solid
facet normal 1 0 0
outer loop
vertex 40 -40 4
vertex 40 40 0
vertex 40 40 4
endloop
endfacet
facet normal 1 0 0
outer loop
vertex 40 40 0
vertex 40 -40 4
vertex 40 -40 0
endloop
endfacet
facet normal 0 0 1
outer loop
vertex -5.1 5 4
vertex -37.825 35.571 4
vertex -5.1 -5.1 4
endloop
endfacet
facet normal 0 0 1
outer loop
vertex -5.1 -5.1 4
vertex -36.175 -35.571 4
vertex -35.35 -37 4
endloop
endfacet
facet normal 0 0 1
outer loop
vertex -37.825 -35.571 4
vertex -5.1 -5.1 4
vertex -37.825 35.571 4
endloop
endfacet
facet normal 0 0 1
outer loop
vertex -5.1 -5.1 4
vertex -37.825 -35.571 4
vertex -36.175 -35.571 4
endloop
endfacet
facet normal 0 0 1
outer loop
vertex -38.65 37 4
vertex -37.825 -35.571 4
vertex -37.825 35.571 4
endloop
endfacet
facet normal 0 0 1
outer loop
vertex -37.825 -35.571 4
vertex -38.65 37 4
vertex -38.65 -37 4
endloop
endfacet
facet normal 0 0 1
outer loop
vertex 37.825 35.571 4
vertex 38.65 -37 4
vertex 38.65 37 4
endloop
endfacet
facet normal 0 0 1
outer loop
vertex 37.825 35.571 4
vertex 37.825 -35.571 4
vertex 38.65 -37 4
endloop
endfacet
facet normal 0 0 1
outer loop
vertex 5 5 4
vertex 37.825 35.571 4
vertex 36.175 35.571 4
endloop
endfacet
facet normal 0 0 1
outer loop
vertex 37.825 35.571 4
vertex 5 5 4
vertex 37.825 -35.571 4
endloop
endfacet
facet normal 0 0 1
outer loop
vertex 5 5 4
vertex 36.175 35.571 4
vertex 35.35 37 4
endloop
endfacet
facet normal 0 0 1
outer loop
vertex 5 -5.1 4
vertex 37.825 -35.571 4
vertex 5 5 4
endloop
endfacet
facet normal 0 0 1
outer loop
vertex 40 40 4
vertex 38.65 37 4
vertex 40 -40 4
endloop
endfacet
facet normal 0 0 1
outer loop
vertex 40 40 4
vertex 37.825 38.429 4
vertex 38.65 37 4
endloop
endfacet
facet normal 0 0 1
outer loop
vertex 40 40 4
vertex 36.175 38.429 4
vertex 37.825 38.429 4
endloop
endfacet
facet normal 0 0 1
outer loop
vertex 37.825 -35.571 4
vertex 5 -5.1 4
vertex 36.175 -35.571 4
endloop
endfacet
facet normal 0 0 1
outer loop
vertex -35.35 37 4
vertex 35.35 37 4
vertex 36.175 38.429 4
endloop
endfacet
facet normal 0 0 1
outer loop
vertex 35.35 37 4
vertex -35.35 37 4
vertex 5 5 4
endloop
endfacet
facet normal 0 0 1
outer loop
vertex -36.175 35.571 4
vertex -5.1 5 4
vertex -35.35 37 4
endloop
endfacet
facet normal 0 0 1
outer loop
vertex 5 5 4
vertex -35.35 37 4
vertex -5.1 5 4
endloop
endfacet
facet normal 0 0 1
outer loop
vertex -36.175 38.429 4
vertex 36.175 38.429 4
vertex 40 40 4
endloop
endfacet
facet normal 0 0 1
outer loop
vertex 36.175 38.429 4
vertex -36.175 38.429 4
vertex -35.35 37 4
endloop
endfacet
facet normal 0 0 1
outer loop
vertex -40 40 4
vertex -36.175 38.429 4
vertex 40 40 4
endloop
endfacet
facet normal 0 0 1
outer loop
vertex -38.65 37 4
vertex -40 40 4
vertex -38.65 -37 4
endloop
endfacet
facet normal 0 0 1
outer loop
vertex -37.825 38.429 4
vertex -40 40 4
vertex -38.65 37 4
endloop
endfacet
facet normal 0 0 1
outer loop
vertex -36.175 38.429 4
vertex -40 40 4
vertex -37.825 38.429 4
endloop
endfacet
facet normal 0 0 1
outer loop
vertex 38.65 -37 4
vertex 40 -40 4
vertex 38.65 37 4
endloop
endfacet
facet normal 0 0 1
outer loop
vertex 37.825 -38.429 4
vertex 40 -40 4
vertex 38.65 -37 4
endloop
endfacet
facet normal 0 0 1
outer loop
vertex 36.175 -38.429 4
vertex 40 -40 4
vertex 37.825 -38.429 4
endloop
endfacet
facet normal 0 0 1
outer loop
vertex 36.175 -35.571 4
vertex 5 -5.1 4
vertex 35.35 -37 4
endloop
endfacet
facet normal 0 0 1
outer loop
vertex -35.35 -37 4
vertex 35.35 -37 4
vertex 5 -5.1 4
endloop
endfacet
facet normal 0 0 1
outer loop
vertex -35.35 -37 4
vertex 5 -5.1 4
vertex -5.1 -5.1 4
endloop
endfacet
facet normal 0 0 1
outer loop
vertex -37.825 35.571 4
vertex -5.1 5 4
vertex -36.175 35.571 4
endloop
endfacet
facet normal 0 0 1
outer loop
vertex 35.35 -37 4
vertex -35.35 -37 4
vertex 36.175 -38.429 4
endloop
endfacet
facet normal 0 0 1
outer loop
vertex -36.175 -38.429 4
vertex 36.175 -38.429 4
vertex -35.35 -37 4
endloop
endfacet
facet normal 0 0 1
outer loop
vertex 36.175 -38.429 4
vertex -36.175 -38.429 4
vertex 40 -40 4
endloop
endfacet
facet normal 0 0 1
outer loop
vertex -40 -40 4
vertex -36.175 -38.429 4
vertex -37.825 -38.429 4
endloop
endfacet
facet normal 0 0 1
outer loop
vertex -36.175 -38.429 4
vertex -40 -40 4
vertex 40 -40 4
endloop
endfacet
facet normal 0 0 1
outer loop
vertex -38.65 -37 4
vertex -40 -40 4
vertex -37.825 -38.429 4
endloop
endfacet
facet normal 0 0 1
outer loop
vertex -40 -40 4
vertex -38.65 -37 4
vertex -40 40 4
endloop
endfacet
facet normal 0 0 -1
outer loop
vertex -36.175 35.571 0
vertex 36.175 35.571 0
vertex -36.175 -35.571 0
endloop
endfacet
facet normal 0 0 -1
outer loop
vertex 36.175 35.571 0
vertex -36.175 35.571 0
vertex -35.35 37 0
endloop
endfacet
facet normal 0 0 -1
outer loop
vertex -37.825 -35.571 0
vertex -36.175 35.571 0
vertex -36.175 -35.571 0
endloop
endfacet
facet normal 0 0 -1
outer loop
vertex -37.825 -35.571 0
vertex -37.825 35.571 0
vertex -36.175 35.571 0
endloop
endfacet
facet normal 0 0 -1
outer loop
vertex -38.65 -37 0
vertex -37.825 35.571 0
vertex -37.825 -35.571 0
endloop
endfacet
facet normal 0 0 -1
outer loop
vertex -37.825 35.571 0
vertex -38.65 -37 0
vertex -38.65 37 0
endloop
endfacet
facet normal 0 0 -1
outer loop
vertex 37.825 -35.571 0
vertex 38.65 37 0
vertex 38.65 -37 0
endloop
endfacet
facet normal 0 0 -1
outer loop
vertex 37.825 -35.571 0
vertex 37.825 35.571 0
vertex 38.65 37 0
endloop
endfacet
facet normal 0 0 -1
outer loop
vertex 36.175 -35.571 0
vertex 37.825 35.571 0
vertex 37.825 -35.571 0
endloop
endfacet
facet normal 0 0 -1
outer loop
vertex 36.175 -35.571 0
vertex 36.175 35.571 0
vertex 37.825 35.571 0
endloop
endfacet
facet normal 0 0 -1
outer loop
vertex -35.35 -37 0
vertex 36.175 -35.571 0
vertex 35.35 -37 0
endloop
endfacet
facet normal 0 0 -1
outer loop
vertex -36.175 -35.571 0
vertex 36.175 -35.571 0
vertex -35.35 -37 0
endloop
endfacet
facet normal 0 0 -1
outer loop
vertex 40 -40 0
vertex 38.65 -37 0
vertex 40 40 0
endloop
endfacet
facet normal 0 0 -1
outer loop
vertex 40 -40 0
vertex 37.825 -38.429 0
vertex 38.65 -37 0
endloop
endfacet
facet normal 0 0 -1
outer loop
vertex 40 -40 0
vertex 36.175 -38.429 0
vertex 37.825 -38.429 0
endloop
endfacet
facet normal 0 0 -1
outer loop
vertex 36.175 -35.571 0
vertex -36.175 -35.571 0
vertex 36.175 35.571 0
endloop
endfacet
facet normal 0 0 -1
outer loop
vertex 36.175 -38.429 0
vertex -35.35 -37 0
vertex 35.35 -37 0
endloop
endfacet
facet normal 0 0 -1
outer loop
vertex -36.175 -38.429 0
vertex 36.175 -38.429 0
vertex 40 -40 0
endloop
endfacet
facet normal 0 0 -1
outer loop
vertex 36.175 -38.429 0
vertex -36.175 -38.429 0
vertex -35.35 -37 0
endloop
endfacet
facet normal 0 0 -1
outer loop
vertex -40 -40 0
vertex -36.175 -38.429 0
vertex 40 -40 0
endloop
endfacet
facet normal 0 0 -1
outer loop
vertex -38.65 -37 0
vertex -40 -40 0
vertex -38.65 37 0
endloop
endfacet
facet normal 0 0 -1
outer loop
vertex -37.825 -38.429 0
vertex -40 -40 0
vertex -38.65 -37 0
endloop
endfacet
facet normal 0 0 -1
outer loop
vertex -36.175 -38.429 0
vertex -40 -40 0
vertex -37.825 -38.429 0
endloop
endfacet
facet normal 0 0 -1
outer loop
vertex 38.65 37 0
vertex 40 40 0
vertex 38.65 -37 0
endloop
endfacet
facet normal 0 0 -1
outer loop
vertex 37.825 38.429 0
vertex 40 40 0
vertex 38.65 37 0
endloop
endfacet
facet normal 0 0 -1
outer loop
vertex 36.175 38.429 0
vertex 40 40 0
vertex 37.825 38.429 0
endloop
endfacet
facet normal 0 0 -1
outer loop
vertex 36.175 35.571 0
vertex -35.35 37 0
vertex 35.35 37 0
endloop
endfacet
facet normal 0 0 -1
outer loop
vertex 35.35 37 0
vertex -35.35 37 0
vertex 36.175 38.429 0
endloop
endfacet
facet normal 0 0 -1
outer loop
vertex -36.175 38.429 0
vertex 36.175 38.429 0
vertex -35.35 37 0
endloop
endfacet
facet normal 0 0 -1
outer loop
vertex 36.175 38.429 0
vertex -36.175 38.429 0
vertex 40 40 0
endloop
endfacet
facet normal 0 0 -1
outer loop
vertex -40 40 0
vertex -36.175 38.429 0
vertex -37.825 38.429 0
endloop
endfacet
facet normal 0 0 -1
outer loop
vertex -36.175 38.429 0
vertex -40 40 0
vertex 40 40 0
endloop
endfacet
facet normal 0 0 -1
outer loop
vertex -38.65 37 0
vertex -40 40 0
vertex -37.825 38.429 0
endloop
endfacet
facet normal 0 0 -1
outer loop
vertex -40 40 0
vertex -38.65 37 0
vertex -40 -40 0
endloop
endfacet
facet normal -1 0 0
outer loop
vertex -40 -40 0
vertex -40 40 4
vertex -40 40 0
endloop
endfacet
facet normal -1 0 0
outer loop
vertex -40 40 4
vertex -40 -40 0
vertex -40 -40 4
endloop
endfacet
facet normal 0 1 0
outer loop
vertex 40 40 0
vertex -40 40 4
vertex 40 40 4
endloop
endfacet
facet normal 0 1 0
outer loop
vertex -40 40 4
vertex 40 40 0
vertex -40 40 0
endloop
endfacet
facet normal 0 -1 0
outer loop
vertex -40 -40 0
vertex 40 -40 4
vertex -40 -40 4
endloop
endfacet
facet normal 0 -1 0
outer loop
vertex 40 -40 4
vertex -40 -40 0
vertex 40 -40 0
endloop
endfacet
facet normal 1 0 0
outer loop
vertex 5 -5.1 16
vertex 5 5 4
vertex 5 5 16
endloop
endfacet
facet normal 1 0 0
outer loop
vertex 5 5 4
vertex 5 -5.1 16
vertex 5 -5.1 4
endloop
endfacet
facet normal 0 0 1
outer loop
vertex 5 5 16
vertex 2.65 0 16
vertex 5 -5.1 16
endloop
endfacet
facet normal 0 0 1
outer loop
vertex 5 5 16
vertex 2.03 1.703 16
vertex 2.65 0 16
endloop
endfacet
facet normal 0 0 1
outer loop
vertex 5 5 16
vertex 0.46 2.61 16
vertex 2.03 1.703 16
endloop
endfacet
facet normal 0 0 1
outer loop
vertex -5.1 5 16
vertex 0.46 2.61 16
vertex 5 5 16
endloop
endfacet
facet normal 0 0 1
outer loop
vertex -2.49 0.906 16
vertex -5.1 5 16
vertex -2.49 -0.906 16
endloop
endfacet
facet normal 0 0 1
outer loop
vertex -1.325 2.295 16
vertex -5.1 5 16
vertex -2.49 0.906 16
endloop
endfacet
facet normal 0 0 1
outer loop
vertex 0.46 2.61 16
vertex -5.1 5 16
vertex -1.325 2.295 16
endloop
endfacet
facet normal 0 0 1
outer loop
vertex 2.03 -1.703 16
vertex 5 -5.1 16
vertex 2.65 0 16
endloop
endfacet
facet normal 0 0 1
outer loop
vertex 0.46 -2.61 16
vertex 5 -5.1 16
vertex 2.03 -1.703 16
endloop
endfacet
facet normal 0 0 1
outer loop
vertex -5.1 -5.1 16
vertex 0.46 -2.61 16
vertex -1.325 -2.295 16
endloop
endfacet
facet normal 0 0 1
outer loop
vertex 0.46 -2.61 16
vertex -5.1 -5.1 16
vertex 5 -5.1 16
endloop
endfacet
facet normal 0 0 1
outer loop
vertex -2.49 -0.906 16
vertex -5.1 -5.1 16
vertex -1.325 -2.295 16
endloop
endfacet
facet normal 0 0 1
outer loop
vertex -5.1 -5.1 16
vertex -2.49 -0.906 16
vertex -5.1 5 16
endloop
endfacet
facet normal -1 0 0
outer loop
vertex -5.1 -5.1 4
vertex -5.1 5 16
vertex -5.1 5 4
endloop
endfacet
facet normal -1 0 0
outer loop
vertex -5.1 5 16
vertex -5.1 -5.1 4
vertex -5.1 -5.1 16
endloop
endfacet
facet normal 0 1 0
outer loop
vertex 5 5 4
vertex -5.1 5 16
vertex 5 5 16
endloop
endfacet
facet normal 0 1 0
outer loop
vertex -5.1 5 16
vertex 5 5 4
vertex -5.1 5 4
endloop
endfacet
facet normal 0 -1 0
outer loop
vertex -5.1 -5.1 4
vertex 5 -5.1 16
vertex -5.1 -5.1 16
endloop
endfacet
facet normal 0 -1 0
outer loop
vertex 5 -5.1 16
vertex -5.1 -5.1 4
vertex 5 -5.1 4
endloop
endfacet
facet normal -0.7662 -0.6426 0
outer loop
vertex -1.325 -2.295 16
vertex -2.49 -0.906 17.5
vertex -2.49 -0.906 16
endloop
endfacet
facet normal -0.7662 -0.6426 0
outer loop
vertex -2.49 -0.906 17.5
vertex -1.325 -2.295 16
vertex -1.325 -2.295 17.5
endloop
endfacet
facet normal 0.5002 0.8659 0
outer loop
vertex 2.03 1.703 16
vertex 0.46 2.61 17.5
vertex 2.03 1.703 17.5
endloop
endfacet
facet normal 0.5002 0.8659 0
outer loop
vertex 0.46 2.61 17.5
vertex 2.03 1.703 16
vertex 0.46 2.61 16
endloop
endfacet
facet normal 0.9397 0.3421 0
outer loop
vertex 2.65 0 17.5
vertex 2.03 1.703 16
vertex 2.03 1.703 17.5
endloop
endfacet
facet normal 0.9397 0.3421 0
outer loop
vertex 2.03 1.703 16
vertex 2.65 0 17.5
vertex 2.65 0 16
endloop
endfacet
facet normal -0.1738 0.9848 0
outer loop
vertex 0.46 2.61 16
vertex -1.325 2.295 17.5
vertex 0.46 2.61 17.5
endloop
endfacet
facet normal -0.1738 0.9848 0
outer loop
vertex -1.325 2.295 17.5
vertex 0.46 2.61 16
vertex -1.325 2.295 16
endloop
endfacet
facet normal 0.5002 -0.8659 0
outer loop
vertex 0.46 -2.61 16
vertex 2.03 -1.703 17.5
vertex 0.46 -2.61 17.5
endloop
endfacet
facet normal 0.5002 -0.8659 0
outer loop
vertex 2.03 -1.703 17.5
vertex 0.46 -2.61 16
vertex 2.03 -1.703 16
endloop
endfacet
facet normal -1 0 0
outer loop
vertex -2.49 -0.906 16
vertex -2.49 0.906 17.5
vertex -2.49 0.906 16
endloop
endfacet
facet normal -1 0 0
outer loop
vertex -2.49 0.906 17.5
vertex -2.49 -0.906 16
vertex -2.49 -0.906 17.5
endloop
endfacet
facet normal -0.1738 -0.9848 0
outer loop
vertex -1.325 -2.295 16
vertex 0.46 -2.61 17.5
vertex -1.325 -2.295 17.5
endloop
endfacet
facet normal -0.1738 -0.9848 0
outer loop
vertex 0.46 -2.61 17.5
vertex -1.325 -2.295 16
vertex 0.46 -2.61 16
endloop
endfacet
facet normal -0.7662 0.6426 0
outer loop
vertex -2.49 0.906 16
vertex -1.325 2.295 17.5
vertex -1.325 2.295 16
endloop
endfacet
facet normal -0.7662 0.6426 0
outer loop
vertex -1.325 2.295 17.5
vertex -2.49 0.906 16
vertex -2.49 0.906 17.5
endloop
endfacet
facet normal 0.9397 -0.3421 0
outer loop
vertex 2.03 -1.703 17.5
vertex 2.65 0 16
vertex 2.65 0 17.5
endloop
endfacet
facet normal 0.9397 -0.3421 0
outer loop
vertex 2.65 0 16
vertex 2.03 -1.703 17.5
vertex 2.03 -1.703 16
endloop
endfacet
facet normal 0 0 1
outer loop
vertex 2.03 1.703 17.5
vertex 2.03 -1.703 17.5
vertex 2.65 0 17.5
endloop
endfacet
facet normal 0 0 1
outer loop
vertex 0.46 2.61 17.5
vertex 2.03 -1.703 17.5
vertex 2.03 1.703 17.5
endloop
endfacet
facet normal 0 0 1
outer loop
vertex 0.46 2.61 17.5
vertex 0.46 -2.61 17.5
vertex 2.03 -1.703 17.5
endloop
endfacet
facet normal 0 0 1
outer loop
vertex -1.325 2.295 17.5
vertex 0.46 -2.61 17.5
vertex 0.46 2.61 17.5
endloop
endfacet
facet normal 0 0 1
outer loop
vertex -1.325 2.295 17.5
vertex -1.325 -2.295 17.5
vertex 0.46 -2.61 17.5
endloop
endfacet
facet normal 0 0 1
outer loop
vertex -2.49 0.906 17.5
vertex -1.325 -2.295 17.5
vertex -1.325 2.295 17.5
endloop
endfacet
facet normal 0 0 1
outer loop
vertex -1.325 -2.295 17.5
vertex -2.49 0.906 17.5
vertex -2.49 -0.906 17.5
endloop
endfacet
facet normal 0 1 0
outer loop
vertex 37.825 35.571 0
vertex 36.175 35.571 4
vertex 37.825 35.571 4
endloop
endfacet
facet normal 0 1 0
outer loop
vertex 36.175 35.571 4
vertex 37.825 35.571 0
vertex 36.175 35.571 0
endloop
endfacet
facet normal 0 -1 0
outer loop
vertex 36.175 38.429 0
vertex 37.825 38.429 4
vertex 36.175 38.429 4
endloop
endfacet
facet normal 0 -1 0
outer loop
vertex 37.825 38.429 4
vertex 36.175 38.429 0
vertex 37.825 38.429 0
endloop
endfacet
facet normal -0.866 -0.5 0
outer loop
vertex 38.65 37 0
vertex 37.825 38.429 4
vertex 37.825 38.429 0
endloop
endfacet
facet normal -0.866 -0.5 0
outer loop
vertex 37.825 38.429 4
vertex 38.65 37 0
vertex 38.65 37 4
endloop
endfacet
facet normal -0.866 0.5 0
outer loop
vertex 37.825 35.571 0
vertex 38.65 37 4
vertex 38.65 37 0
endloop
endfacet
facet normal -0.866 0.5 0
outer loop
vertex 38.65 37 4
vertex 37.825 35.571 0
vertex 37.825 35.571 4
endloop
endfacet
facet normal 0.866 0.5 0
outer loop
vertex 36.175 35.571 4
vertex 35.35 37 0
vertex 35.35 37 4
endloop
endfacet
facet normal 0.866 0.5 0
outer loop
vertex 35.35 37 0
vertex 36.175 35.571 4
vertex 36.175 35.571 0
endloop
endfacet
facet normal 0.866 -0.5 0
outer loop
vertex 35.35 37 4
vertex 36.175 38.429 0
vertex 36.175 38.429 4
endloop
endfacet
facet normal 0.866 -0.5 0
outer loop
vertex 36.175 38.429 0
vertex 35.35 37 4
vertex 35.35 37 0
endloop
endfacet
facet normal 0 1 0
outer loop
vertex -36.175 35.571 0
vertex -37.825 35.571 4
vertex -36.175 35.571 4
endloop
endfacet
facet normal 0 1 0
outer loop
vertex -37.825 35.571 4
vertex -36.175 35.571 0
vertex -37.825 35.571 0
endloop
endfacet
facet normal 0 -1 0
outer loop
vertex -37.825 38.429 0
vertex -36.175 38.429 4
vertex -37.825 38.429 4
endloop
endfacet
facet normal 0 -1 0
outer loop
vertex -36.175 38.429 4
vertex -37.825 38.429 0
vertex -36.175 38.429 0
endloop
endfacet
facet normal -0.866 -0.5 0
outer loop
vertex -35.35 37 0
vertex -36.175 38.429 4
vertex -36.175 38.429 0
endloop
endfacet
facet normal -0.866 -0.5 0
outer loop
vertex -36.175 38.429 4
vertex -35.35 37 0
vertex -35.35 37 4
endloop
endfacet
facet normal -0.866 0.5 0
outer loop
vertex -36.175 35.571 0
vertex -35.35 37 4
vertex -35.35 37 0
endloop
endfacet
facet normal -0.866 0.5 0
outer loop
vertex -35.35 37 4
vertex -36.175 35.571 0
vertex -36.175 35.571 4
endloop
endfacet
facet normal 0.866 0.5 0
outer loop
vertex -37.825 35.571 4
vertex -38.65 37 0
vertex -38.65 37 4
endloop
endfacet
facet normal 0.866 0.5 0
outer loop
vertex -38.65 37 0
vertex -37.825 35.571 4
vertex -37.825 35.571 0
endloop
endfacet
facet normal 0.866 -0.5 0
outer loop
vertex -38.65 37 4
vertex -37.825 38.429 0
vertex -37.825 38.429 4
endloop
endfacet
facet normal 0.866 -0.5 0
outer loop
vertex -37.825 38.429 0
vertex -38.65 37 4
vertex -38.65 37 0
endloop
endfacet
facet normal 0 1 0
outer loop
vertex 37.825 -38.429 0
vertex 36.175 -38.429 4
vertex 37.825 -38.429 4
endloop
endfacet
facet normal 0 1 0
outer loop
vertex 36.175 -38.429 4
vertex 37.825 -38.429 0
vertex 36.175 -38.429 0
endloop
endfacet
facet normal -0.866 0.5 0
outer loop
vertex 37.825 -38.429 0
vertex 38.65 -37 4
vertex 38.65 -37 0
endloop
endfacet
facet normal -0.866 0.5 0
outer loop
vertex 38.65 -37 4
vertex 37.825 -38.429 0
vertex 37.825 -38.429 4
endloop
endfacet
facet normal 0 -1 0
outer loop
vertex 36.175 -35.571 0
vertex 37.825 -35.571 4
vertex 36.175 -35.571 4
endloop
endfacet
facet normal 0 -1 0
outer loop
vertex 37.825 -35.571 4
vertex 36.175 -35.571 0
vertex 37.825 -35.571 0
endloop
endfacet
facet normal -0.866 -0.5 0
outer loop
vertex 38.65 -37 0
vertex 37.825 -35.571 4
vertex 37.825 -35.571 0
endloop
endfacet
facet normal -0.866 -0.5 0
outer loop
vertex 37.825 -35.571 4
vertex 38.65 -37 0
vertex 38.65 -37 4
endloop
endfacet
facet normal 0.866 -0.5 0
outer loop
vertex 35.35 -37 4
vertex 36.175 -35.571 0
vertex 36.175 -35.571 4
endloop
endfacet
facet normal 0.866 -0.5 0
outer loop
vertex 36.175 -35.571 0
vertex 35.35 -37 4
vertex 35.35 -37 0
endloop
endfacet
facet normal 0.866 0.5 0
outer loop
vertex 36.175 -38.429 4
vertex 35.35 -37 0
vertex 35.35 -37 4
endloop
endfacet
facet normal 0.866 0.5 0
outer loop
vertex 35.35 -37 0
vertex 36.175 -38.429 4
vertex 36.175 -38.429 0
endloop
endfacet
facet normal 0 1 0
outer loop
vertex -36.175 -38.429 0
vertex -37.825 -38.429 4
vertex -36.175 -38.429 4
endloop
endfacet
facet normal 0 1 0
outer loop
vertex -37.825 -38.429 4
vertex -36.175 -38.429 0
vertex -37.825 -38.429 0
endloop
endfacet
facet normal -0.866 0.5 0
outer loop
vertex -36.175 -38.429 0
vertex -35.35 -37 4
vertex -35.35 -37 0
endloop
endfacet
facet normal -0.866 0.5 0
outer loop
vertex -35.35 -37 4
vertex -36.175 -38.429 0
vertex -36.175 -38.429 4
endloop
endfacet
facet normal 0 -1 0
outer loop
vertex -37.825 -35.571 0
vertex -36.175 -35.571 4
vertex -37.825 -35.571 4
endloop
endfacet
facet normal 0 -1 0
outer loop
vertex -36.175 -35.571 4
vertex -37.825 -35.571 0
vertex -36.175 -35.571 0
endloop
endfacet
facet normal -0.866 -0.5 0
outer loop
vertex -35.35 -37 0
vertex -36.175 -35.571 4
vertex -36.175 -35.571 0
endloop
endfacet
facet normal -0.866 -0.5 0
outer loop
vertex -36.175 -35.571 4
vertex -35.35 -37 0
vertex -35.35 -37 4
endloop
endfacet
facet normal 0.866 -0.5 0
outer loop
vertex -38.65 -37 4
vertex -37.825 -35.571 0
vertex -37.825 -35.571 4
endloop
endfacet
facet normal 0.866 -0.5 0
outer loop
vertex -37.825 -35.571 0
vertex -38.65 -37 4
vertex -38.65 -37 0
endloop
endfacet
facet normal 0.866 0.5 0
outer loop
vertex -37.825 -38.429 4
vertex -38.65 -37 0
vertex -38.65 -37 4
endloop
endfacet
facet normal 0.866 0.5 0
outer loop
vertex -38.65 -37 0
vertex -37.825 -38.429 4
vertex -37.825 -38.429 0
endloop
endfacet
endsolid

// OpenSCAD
tezoslogowithhole();
nohole();
//hole();

module tezoslogowithhole()
{
    difference()
    {
    translate([0,12.5,53])
    rotate([90,0,0])
    tezoslogo();
    nohole();
    }
}

module tezoslogo()
{
    difference()
    {
    linear_extrude(height=25)
    scale([.2,.2,.2])
    translate([-400,-1900,0])
    import("tezos.dxf");
    
    translate([0,0,2])
    linear_extrude(height=21)
    offset(r=-2.5)
    scale([.2,.2,.2])
    translate([-400,-1900,0])
    import("tezos.dxf");
    }
}
module nohole()
{
difference()
{
union()
    {
standBTC();
    translate([-5.1,-5.1,0])
    cube([10.1,10.1,16]);
    cylinder(r=5.3/2, h=17.5);
    }
  //  cylinder(r=5.3/2, h=18);
    
    translate([37,37,0])
    cylinder(r=3.3/2, h=9);
    translate([-37,37,0])
    cylinder(r=3.3/2, h=9);
    translate([37,-37,0])
    cylinder(r=3.3/2, h=9);
    translate([-37,-37,0])
    cylinder(r=3.3/2, h=9);
    

}  
}
module hole()
{
difference()
{
union()
    {
standBTC();
    translate([-5,-5,0])
    cube([10,10,15]);
  //  cylinder(r=5.3/2, h=20);
    }
    cylinder(r=5.3/2, h=18);
    
    translate([37,37,0])
    cylinder(r=3.3/2, h=9);
    translate([-37,37,0])
    cylinder(r=3.3/2, h=9);
    translate([37,-37,0])
    cylinder(r=3.3/2, h=9);
    translate([-37,-37,0])
    cylinder(r=3.3/2, h=9);
    

}  
}
module standBTC()
{
translate([-40,-40,0])
cube([80,80,4]);
//coin();
}
module coin()
{


rotate([0,0,45])
translate([0,0,43])
    {
union()
        {
logo();
translate([0,5,0])
rotate([90,0,0])
cylinder(h=10, r=50);
            
}
}
}




module oldlogo()
{
import("logo3.stl");
}
module logo()
{
    import("btclogo2.stl");
    }
